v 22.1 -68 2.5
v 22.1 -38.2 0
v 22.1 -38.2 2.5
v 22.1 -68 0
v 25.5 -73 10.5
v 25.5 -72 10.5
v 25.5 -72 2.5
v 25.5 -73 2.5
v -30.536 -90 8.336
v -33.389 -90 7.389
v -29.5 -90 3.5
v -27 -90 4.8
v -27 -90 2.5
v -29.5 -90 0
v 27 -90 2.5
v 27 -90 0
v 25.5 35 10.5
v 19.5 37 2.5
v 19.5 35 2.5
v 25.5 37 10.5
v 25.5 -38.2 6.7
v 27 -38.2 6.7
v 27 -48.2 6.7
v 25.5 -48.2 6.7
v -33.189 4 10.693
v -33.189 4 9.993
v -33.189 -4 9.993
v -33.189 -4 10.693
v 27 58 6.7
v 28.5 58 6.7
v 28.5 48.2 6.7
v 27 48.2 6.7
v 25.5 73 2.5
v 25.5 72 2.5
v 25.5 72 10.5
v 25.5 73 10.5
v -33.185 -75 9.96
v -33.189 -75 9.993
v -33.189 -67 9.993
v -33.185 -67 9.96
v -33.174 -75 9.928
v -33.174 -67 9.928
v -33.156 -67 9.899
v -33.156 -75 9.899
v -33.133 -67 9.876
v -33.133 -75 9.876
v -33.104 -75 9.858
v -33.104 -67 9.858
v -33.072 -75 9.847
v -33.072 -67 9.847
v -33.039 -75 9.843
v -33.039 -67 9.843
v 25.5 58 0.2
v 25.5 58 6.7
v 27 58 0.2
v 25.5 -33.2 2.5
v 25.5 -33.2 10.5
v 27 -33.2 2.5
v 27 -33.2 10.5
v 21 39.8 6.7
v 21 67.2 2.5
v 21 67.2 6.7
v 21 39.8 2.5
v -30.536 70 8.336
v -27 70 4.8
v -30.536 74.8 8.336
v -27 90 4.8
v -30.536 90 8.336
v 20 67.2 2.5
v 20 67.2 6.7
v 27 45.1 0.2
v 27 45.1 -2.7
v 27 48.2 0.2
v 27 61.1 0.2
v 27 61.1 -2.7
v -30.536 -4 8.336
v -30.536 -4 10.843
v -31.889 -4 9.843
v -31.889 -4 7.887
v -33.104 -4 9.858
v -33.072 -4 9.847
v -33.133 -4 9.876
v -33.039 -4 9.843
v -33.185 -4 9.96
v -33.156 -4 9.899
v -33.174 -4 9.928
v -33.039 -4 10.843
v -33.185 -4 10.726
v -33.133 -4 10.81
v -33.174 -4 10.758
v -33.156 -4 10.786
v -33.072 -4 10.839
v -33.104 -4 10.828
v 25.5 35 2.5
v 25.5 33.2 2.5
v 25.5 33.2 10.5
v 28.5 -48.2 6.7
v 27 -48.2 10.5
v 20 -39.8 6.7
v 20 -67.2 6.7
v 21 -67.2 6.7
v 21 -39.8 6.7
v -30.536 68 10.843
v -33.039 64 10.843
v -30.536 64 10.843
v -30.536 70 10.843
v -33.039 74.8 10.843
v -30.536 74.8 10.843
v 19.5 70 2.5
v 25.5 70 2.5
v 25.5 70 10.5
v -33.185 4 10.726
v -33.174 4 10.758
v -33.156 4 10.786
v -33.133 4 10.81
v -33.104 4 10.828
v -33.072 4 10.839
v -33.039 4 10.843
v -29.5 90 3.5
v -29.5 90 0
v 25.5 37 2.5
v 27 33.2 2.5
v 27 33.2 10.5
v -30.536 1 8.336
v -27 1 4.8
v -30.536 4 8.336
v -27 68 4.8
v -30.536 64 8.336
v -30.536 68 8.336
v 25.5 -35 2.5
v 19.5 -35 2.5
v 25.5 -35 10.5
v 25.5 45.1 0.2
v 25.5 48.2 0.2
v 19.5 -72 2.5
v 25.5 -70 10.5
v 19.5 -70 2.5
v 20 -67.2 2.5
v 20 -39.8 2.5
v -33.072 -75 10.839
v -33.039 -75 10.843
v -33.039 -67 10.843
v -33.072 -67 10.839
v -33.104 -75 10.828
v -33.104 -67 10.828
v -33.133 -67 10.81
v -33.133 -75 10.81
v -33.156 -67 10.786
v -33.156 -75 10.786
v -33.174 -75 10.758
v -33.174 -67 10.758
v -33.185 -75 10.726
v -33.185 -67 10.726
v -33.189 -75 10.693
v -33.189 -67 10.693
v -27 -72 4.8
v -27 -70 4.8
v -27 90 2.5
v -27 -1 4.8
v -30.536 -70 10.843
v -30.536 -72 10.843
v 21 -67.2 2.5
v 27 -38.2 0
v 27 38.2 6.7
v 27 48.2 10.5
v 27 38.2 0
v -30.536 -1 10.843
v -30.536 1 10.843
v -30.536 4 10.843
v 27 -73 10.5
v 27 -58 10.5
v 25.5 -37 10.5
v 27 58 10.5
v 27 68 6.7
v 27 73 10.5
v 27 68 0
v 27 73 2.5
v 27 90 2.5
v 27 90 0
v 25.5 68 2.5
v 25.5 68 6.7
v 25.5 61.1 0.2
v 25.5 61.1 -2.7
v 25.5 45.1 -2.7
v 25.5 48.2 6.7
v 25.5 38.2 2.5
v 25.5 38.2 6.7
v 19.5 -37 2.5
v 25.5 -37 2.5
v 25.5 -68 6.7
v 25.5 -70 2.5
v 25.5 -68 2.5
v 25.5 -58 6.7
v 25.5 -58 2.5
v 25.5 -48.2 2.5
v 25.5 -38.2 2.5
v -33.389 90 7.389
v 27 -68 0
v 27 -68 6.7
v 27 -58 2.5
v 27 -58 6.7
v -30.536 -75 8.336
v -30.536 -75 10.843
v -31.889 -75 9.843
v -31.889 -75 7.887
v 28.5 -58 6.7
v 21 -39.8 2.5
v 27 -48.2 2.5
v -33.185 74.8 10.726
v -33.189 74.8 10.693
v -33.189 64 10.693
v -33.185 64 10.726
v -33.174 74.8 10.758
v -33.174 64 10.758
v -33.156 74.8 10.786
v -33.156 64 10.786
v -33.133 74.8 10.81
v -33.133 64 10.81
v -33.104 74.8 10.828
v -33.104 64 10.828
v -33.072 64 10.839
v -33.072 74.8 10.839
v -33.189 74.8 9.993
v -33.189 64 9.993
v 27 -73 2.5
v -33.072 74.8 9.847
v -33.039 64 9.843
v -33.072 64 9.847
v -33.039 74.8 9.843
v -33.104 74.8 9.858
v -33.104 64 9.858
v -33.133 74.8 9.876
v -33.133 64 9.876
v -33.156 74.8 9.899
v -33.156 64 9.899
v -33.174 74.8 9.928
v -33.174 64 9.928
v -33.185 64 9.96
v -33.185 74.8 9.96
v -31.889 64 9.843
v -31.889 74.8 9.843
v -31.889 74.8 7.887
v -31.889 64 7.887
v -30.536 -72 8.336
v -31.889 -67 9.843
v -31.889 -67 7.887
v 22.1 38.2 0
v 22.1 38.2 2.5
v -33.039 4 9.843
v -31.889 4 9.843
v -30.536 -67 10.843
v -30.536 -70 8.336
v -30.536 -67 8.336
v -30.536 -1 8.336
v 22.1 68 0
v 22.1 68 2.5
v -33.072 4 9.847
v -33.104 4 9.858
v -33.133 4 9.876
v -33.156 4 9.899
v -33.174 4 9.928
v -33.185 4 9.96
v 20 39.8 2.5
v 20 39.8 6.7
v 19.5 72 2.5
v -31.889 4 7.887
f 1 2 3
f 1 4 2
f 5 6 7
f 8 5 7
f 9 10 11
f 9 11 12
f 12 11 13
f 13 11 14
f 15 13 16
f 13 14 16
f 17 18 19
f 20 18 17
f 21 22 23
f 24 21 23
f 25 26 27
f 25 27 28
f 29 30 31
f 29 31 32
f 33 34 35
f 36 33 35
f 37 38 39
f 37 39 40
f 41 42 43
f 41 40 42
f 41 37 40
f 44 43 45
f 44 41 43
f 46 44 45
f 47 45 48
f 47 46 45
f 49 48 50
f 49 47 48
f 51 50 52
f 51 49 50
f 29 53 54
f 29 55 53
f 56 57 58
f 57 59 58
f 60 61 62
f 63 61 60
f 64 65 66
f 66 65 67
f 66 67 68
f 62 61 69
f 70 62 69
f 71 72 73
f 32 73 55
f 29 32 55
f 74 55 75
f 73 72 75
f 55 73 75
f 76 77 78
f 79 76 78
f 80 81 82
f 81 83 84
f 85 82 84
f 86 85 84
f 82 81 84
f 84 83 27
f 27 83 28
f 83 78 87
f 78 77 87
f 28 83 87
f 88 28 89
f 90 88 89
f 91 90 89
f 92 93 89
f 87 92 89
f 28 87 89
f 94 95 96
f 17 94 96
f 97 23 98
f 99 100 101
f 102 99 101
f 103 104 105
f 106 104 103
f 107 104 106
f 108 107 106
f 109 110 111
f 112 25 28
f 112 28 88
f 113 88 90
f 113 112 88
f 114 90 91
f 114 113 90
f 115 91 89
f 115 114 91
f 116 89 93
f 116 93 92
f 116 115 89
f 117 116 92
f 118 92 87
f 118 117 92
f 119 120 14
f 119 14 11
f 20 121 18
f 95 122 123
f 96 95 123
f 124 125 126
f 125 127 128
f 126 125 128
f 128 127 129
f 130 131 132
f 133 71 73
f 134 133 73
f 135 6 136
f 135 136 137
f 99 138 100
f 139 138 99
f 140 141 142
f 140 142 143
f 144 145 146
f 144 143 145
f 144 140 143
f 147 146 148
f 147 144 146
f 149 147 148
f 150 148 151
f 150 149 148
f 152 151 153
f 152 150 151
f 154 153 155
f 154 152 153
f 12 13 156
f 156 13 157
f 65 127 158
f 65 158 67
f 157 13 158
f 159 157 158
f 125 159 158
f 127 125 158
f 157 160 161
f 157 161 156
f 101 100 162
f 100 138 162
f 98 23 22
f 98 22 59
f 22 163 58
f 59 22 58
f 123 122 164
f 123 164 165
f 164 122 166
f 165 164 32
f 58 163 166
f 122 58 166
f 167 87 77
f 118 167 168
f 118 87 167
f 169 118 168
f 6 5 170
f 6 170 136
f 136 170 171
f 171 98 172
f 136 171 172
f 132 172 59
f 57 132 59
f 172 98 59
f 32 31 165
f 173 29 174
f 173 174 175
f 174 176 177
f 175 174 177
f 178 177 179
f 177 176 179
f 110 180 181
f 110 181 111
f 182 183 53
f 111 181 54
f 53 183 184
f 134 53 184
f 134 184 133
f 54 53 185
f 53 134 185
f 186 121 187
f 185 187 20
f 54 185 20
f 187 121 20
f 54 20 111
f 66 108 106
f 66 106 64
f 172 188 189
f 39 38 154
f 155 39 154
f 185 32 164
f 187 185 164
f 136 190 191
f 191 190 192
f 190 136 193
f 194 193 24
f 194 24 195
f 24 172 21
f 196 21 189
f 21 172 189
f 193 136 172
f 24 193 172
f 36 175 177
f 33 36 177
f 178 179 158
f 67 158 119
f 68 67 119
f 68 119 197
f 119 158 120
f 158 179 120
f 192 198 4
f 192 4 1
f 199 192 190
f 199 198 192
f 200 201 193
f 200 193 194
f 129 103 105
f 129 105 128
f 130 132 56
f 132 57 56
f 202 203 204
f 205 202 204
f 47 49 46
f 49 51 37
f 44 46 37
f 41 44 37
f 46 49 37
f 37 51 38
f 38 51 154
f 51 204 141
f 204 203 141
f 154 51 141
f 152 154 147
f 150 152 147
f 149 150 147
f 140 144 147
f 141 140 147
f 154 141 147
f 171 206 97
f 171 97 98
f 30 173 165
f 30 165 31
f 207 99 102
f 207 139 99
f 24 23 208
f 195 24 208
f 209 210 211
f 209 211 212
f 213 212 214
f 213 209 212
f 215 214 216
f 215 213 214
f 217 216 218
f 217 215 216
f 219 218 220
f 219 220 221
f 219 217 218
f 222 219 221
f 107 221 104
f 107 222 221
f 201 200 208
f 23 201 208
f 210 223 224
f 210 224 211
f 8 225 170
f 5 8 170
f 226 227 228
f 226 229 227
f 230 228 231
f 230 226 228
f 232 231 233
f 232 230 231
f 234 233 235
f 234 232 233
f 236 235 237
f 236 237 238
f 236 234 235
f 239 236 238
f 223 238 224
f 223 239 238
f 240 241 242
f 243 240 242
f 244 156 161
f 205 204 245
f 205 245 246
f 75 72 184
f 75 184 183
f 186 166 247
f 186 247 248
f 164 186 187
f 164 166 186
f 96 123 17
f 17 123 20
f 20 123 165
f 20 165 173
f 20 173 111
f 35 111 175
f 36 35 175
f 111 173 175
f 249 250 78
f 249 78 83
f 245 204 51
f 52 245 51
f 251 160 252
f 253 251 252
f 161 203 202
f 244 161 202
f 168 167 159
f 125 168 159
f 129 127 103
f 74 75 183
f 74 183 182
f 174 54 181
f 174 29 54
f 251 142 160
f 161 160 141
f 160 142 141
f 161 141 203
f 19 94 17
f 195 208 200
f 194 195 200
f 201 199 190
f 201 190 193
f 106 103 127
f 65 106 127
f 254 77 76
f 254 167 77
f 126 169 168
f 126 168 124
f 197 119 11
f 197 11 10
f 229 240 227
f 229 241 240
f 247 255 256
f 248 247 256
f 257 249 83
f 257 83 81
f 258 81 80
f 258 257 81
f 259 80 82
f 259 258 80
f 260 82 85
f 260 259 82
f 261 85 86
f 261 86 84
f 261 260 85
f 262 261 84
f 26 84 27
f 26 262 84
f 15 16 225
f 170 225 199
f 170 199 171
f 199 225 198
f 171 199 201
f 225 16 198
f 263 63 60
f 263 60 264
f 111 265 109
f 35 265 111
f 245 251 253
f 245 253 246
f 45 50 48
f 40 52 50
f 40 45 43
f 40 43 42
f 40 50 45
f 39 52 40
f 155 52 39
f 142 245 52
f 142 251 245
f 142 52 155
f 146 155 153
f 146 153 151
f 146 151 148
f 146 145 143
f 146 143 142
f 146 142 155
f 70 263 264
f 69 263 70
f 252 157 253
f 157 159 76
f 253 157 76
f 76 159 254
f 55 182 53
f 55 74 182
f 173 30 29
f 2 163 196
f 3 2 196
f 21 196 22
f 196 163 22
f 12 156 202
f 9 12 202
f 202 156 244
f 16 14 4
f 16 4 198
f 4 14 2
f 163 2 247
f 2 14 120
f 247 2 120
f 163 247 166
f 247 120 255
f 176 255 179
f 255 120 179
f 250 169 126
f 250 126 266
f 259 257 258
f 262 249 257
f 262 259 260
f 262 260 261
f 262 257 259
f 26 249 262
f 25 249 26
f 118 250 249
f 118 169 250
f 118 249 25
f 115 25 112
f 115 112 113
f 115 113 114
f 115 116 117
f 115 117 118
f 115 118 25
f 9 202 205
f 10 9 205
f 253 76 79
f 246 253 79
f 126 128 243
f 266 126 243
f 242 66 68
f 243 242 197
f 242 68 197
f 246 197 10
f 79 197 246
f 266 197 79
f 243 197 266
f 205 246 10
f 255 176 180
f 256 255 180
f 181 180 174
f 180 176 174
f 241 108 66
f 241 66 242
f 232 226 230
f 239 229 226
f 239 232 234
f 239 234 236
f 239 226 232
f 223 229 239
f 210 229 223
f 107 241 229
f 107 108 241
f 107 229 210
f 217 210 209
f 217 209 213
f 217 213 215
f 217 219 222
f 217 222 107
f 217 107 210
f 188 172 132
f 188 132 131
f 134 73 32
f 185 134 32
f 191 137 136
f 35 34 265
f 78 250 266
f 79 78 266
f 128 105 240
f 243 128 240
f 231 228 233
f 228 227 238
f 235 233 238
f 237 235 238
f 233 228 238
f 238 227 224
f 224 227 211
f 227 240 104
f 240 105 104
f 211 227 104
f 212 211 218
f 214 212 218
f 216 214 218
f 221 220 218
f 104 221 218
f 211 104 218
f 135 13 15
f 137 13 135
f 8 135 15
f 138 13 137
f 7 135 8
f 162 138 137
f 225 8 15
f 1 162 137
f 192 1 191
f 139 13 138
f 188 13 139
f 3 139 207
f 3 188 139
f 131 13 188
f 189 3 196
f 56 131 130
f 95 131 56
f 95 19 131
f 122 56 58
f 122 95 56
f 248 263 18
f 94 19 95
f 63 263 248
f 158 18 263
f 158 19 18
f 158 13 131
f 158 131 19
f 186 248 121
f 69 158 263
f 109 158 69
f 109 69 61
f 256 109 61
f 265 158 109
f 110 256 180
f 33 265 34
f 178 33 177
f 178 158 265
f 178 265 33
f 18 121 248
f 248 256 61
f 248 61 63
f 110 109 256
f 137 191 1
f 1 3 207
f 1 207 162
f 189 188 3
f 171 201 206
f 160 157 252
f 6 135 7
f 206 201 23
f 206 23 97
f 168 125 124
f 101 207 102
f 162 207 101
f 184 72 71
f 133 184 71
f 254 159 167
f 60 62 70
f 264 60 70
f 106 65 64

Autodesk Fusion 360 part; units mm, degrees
sketch "Sketch1" plane through (0, 0, 0) normal (0, 0, 1) x (1, 0, 0)
  line L0 (27, 90) -> (-27, 90)
  line L1 (-27, 90) -> (-27, -90)
  line L2 (-27, -90) -> (27, -90)
  line L3 (27, -90) -> (27, 90)
  dimension "d1" = 54
  dimension "d2" = 180
extrude "Extrude1" add sketch "Sketch1" along normal blind 2.5
sketch "Sketch2" plane through (0, 90, 0) normal (0, 1, 0) x (-1, 0, 0)
  line L0 (-27, 0) -> (27, 0)
  line L1 (27, 0) -> (27, 2.5)
  line L2 (27, 2.5) -> (-27, 2.5)
  line L3 (-27, 2.5) -> (-27, 0)
  line L4 (27, 0) -> (29.5, 0)
  line L5 (29.5, 0) -> (29.5, 2.5)
  line L6 (27, 2.5) -> (27, 4.8)
  line L7 (29.5, 0) -> (29.5, 3.5)
  line L8 (29.5, 3.5) -> (33.3891, 7.3891)
  line L9 (27, 4.8) -> (30.5355, 8.3355)
  line L10 (27, 4.8) -> (32.5, 4.8) construction
  line L11 (30.5355, 8.3355) -> (33.3891, 7.3891)
  dimension "d5" = 2.5
  dimension "d6" = 2.5
  dimension "d7" = 2.3
  dimension "d8" = 135
  dimension "d9" = 5.5
  dimension "d10" = 45
  dimension "d11" = 5
extrude "Extrude2" add sketch "Sketch2" against normal blind 180 contours L1 L4 L5 L6 L7 L8 L9 L11
sketch "Sketch3" plane through (0, 90, 0) normal (0, 1, 0) x (-1, 0, 0)
  line L0 (-27, 0) -> (29.5, 0)
  line L1 (29.5, 0) -> (29.5, 3.5)
  line L2 (29.5, 3.5) -> (33.3891, 7.3891)
  line L3 (33.3891, 7.3891) -> (30.5355, 8.3355)
  line L4 (30.5355, 8.3355) -> (27, 4.8)
  line L5 (27, 4.8) -> (27, 2.5)
  line L6 (27, 2.5) -> (-27, 2.5)
  line L7 (-27, 2.5) -> (-27, 0)
  line L8 (31.8891, 8.3429) -> (31.8891, 7.8866)
  line L9 (31.8891, 8.3429) -> (31.8891, 9.8429)
  line L10 (31.8891, 9.8429) -> (33.0391, 9.8429)
  line L11 (33.1891, 9.9929) -> (33.1891, 10.6929)
  line L12 (33.0391, 10.8429) -> (30.5355, 10.8429)
  line L13 (30.5355, 10.8429) -> (30.5355, 8.3355)
  arc A0 (33.1891, 10.6929) -> (33.0391, 10.8429) centre (33.0391, 10.6929) ccw
  arc A1 (33.0391, 9.8429) -> (33.1891, 9.9929) centre (33.0391, 9.9929) ccw
  line L14 (30.5355, 10.8429) -> (27, 4.8)
  point P0 (33.1891, 9.8429)
  point P1 (33.1891, 10.8429)
  dimension "d15" = 1.5
  dimension "d16" = 1.3
  dimension "d17" = 1
  dimension "d19" = 0.15
  dimension "d24" = 1.5
extrude "Extrude3" add sketch "Sketch3" along normal blind -26 and the other way blind 15.2 contours L3 L8 L9 L10 L11 L12 L13 A0 A1
extrude "Extrude4" add sketch "Sketch3" along normal blind -20 and the other way blind 22 contours L4 L13 L14
extrude "Extrude5" add sketch "Sketch3" along normal blind -94 and the other way blind 86 contours L3 L8 L9 L10 L11 L12 L13 A0 A1
extrude "Extrude6" add sketch "Sketch3" along normal blind -157 and the other way blind 165 contours L3 L8 L9 L10 L11 L12 L13 A0 A1
extrude "Extrude7" add sketch "Sketch3" along normal blind -162 and the other way blind 160 contours L4 L13 L14
extrude "Extrude8" add sketch "Sketch3" along normal blind -89 and the other way blind 91 contours L4 L13 L14
sketch "Sketch4" plane through (27, 0, 0) normal (1, 0, 0) x (0, 0, -1)
  line L0 (0, -90) -> (0, 90)
  line L1 (0, 90) -> (-2.5, 90)
  line L2 (-2.5, 90) -> (-2.5, -90)
  line L3 (-2.5, -90) -> (0, -90)
  line L4 (-2.5, -90) -> (-2.5, -73)
  line L5 (-2.5, -73) -> (-10.5, -73)
  line L6 (-10.5, -73) -> (-10.5, -33.2)
  line L7 (-2.5, -73) -> (-2.5, -68)
  line L8 (-2.5, -68) -> (-6.7, -68)
  line L9 (-10.5, -33.2) -> (-2.5, -33.2)
  line L10 (-6.7, -68) -> (-6.7, -58)
  line L11 (-6.7, -58) -> (-0.2, -58)
  line L12 (-0.2, -58) -> (-0.2, -61.1)
  line L13 (-0.2, -61.1) -> (2.7, -61.1)
  line L14 (2.7, -61.1) -> (2.7, -45.1)
  line L15 (-0.2, -48.2) -> (-0.2, -45.1)
  line L16 (-0.2, -45.1) -> (2.7, -45.1)
  line L17 (-6.7, -48.2) -> (-0.2, -48.2)
  line L18 (-6.7, -38.2) -> (-6.7, -48.2)
  line L19 (-2.5, -33.2) -> (-2.5, -38.2)
  line L20 (-2.5, -38.2) -> (-6.7, -38.2)
  line L21 (2.7, -61.1) -> (2.7, -69)
  line L22 (-2.5, -68) -> (2.7, -68)
  line L23 (-2.5, -38.2) -> (3, -38.2)
  line L24 (2.7, -45.1) -> (2.7, -38.2)
  line L25 (-1.75, 0) -> (-22.5, 0)
  line L26 (-0.2, 48.2) -> (-0.2, 45.1)
  line L27 (-0.2, 61.1) -> (2.7, 61.1)
  line L28 (-10.5, 73) -> (-10.5, 33.2)
  line L29 (-0.2, 58) -> (-0.2, 61.1)
  line L30 (-2.5, 38.2) -> (3, 38.2)
  line L31 (2.7, 61.1) -> (2.7, 69)
  line L32 (-6.7, 68) -> (-6.7, 58)
  line L33 (2.7, 61.1) -> (2.7, 45.1)
  line L34 (-6.7, 38.2) -> (-6.7, 48.2)
  line L35 (2.7, 45.1) -> (2.7, 38.2)
  line L36 (-10.5, 33.2) -> (-2.5, 33.2)
  line L37 (-2.5, 68) -> (-6.7, 68)
  line L38 (-2.5, 73) -> (-2.5, 68)
  line L39 (-6.7, 48.2) -> (-0.2, 48.2)
  line L40 (-0.2, 45.1) -> (2.7, 45.1)
  line L41 (-2.5, 68) -> (2.7, 68)
  line L42 (-2.5, 38.2) -> (-6.7, 38.2)
  line L43 (-2.5, 33.2) -> (-2.5, 38.2)
  line L44 (-2.5, 73) -> (-10.5, 73)
  line L45 (-6.7, 58) -> (-0.2, 58)
  dimension "d45" = 17
  dimension "d46" = 8
  dimension "d47" = 39.8
  dimension "d48" = 4.2
  dimension "d50" = 6.5
  dimension "d51" = 3.1
  dimension "d52" = 2.9
extrude "Extrude9" cut sketch "Sketch4" against normal blind 4.9 contours L0 L2 L11 L12 L13 L22 | L0 L13 L21 L22 | L0 L2 L11 L12 L13 L15 L16 L17 | L0 L13 L14 L16 | L2 L8 L10 L11 | L0 L2 L15 L16 L17 L23 | L0 L16 L23 L24 | L2 L17 L18 L20 | L0 L2 L26 L30 L39 L40 | L0 L30 L35 L40 | L0 L2 L26 L27 L29 L39 L40 L45 | L0 L27 L33 L40 | L2 L34 L39 L42 | L0 L2 L27 L29 L41 L45 | L0 L27 L31 L41 | L2 L32 L37 L45
extrude "Extrude10" add sketch "Sketch4" against normal blind 1.5 contours L0 L2 L11 L12 L13 L15 L16 L17 | L0 L13 L14 L16 | L2 L5 L6 L7 L8 L9 L10 L11 L17 L18 L19 L20
sketch "Sketch5" plane through (0, -73, 0) normal (0, -1, 0) x (1, 0, 0)
  line L0 (27, 2.5) -> (27, 10.5)
  line L1 (27, 10.5) -> (25.5, 10.5)
  line L2 (25.5, 10.5) -> (25.5, 2.5)
  line L3 (25.5, 2.5) -> (27, 2.5)
  line L4 (27, 10.5) -> (27, 6.7)
  line L5 (27, 6.7) -> (28.5, 6.7)
  line L6 (28.5, 6.7) -> (27, 10.5)
extrude "Extrude11" add sketch "Sketch5" along normal blind -24.8 and the other way blind 15 contours L0 L4 L5 L6
sketch "Sketch6" plane through (0, -73, 0) normal (0, -1, 0) x (1, 0, 0)
  line L0 (27, 2.5) -> (27, 10.5)
  line L1 (27, 10.5) -> (25.5, 10.5)
  line L2 (25.5, 10.5) -> (25.5, 2.5)
  line L3 (25.5, 2.5) -> (27, 2.5)
  line L4 (27, 2.5) -> (14.9732, 2.5)
  line L5 (25.5, 10.5) -> (19.5, 2.5)
  point P0 (25.5, 2.5)
  dimension "d62" = 6
extrude "Extrude12" add sketch "Sketch6" along normal blind -3 and the other way blind 1 contours L2 L4 L5
extrude "Extrude13" add sketch "Sketch6" along normal blind -38 and the other way blind 36 contours L2 L4 L5
sketch "Sketch7" plane through (0, 0, 2.5) normal (0, 0, 1) x (1, 0, 0)
  line L0 (19.5, -35) -> (25.5, -35)
  line L1 (25.5, -35) -> (25.5, -33.2)
  line L2 (25.5, -33.2) -> (27, -33.2)
  line L3 (27, -33.2) -> (27, 38.2)
  line L4 (27, 90) -> (-27, 90)
  line L5 (-27, 90) -> (-27, -90)
  line L6 (-27, -90) -> (27, -90)
  line L7 (27, -90) -> (27, -73)
  line L8 (27, -73) -> (25.5, -73)
  line L9 (25.5, -73) -> (25.5, -72)
  line L10 (25.5, -72) -> (19.5, -72)
  line L11 (19.5, -72) -> (19.5, -70)
  line L12 (19.5, -70) -> (25.5, -70)
  line L13 (25.5, -70) -> (25.5, -68)
  line L14 (25.5, -68) -> (22.1, -68)
  line L15 (22.1, 38.2) -> (22.1, 68)
  line L16 (22.1, -38.2) -> (25.5, -38.2)
  line L17 (25.5, -38.2) -> (25.5, -37)
  line L18 (25.5, -37) -> (19.5, -37)
  line L19 (19.5, -37) -> (19.5, -35)
  line L20 (20, -37) -> (20, -39.8)
  line L21 (20, -70) -> (20, -67.2)
  line L22 (20, -39.8) -> (21, -39.8)
  line L23 (21, -39.8) -> (21, -67.4697)
  line L24 (20, -67.2) -> (21, -67.2)
  line L25 (20, -67.2) -> (20, -39.8)
  line L26 (27, 38.2) -> (22.1, 38.2)
  line L27 (22.1, 68) -> (27, 68)
  line L28 (27, 68) -> (27, 90)
  line L29 (22.1, -68) -> (22.1, -38.2)
  dimension "d71" = 2.8
  dimension "d72" = 2.8
extrude "Extrude14" add sketch "Sketch7" along normal blind 4.2 contours L22 L23 L24 L25
mirror "Mirror1" about plane through (0, 0, 0) normal (0, 1, 0) of "Extrude1", "Extrude9", "Extrude10", "Extrude11", "Extrude12", "Extrude13", "Extrude14"
